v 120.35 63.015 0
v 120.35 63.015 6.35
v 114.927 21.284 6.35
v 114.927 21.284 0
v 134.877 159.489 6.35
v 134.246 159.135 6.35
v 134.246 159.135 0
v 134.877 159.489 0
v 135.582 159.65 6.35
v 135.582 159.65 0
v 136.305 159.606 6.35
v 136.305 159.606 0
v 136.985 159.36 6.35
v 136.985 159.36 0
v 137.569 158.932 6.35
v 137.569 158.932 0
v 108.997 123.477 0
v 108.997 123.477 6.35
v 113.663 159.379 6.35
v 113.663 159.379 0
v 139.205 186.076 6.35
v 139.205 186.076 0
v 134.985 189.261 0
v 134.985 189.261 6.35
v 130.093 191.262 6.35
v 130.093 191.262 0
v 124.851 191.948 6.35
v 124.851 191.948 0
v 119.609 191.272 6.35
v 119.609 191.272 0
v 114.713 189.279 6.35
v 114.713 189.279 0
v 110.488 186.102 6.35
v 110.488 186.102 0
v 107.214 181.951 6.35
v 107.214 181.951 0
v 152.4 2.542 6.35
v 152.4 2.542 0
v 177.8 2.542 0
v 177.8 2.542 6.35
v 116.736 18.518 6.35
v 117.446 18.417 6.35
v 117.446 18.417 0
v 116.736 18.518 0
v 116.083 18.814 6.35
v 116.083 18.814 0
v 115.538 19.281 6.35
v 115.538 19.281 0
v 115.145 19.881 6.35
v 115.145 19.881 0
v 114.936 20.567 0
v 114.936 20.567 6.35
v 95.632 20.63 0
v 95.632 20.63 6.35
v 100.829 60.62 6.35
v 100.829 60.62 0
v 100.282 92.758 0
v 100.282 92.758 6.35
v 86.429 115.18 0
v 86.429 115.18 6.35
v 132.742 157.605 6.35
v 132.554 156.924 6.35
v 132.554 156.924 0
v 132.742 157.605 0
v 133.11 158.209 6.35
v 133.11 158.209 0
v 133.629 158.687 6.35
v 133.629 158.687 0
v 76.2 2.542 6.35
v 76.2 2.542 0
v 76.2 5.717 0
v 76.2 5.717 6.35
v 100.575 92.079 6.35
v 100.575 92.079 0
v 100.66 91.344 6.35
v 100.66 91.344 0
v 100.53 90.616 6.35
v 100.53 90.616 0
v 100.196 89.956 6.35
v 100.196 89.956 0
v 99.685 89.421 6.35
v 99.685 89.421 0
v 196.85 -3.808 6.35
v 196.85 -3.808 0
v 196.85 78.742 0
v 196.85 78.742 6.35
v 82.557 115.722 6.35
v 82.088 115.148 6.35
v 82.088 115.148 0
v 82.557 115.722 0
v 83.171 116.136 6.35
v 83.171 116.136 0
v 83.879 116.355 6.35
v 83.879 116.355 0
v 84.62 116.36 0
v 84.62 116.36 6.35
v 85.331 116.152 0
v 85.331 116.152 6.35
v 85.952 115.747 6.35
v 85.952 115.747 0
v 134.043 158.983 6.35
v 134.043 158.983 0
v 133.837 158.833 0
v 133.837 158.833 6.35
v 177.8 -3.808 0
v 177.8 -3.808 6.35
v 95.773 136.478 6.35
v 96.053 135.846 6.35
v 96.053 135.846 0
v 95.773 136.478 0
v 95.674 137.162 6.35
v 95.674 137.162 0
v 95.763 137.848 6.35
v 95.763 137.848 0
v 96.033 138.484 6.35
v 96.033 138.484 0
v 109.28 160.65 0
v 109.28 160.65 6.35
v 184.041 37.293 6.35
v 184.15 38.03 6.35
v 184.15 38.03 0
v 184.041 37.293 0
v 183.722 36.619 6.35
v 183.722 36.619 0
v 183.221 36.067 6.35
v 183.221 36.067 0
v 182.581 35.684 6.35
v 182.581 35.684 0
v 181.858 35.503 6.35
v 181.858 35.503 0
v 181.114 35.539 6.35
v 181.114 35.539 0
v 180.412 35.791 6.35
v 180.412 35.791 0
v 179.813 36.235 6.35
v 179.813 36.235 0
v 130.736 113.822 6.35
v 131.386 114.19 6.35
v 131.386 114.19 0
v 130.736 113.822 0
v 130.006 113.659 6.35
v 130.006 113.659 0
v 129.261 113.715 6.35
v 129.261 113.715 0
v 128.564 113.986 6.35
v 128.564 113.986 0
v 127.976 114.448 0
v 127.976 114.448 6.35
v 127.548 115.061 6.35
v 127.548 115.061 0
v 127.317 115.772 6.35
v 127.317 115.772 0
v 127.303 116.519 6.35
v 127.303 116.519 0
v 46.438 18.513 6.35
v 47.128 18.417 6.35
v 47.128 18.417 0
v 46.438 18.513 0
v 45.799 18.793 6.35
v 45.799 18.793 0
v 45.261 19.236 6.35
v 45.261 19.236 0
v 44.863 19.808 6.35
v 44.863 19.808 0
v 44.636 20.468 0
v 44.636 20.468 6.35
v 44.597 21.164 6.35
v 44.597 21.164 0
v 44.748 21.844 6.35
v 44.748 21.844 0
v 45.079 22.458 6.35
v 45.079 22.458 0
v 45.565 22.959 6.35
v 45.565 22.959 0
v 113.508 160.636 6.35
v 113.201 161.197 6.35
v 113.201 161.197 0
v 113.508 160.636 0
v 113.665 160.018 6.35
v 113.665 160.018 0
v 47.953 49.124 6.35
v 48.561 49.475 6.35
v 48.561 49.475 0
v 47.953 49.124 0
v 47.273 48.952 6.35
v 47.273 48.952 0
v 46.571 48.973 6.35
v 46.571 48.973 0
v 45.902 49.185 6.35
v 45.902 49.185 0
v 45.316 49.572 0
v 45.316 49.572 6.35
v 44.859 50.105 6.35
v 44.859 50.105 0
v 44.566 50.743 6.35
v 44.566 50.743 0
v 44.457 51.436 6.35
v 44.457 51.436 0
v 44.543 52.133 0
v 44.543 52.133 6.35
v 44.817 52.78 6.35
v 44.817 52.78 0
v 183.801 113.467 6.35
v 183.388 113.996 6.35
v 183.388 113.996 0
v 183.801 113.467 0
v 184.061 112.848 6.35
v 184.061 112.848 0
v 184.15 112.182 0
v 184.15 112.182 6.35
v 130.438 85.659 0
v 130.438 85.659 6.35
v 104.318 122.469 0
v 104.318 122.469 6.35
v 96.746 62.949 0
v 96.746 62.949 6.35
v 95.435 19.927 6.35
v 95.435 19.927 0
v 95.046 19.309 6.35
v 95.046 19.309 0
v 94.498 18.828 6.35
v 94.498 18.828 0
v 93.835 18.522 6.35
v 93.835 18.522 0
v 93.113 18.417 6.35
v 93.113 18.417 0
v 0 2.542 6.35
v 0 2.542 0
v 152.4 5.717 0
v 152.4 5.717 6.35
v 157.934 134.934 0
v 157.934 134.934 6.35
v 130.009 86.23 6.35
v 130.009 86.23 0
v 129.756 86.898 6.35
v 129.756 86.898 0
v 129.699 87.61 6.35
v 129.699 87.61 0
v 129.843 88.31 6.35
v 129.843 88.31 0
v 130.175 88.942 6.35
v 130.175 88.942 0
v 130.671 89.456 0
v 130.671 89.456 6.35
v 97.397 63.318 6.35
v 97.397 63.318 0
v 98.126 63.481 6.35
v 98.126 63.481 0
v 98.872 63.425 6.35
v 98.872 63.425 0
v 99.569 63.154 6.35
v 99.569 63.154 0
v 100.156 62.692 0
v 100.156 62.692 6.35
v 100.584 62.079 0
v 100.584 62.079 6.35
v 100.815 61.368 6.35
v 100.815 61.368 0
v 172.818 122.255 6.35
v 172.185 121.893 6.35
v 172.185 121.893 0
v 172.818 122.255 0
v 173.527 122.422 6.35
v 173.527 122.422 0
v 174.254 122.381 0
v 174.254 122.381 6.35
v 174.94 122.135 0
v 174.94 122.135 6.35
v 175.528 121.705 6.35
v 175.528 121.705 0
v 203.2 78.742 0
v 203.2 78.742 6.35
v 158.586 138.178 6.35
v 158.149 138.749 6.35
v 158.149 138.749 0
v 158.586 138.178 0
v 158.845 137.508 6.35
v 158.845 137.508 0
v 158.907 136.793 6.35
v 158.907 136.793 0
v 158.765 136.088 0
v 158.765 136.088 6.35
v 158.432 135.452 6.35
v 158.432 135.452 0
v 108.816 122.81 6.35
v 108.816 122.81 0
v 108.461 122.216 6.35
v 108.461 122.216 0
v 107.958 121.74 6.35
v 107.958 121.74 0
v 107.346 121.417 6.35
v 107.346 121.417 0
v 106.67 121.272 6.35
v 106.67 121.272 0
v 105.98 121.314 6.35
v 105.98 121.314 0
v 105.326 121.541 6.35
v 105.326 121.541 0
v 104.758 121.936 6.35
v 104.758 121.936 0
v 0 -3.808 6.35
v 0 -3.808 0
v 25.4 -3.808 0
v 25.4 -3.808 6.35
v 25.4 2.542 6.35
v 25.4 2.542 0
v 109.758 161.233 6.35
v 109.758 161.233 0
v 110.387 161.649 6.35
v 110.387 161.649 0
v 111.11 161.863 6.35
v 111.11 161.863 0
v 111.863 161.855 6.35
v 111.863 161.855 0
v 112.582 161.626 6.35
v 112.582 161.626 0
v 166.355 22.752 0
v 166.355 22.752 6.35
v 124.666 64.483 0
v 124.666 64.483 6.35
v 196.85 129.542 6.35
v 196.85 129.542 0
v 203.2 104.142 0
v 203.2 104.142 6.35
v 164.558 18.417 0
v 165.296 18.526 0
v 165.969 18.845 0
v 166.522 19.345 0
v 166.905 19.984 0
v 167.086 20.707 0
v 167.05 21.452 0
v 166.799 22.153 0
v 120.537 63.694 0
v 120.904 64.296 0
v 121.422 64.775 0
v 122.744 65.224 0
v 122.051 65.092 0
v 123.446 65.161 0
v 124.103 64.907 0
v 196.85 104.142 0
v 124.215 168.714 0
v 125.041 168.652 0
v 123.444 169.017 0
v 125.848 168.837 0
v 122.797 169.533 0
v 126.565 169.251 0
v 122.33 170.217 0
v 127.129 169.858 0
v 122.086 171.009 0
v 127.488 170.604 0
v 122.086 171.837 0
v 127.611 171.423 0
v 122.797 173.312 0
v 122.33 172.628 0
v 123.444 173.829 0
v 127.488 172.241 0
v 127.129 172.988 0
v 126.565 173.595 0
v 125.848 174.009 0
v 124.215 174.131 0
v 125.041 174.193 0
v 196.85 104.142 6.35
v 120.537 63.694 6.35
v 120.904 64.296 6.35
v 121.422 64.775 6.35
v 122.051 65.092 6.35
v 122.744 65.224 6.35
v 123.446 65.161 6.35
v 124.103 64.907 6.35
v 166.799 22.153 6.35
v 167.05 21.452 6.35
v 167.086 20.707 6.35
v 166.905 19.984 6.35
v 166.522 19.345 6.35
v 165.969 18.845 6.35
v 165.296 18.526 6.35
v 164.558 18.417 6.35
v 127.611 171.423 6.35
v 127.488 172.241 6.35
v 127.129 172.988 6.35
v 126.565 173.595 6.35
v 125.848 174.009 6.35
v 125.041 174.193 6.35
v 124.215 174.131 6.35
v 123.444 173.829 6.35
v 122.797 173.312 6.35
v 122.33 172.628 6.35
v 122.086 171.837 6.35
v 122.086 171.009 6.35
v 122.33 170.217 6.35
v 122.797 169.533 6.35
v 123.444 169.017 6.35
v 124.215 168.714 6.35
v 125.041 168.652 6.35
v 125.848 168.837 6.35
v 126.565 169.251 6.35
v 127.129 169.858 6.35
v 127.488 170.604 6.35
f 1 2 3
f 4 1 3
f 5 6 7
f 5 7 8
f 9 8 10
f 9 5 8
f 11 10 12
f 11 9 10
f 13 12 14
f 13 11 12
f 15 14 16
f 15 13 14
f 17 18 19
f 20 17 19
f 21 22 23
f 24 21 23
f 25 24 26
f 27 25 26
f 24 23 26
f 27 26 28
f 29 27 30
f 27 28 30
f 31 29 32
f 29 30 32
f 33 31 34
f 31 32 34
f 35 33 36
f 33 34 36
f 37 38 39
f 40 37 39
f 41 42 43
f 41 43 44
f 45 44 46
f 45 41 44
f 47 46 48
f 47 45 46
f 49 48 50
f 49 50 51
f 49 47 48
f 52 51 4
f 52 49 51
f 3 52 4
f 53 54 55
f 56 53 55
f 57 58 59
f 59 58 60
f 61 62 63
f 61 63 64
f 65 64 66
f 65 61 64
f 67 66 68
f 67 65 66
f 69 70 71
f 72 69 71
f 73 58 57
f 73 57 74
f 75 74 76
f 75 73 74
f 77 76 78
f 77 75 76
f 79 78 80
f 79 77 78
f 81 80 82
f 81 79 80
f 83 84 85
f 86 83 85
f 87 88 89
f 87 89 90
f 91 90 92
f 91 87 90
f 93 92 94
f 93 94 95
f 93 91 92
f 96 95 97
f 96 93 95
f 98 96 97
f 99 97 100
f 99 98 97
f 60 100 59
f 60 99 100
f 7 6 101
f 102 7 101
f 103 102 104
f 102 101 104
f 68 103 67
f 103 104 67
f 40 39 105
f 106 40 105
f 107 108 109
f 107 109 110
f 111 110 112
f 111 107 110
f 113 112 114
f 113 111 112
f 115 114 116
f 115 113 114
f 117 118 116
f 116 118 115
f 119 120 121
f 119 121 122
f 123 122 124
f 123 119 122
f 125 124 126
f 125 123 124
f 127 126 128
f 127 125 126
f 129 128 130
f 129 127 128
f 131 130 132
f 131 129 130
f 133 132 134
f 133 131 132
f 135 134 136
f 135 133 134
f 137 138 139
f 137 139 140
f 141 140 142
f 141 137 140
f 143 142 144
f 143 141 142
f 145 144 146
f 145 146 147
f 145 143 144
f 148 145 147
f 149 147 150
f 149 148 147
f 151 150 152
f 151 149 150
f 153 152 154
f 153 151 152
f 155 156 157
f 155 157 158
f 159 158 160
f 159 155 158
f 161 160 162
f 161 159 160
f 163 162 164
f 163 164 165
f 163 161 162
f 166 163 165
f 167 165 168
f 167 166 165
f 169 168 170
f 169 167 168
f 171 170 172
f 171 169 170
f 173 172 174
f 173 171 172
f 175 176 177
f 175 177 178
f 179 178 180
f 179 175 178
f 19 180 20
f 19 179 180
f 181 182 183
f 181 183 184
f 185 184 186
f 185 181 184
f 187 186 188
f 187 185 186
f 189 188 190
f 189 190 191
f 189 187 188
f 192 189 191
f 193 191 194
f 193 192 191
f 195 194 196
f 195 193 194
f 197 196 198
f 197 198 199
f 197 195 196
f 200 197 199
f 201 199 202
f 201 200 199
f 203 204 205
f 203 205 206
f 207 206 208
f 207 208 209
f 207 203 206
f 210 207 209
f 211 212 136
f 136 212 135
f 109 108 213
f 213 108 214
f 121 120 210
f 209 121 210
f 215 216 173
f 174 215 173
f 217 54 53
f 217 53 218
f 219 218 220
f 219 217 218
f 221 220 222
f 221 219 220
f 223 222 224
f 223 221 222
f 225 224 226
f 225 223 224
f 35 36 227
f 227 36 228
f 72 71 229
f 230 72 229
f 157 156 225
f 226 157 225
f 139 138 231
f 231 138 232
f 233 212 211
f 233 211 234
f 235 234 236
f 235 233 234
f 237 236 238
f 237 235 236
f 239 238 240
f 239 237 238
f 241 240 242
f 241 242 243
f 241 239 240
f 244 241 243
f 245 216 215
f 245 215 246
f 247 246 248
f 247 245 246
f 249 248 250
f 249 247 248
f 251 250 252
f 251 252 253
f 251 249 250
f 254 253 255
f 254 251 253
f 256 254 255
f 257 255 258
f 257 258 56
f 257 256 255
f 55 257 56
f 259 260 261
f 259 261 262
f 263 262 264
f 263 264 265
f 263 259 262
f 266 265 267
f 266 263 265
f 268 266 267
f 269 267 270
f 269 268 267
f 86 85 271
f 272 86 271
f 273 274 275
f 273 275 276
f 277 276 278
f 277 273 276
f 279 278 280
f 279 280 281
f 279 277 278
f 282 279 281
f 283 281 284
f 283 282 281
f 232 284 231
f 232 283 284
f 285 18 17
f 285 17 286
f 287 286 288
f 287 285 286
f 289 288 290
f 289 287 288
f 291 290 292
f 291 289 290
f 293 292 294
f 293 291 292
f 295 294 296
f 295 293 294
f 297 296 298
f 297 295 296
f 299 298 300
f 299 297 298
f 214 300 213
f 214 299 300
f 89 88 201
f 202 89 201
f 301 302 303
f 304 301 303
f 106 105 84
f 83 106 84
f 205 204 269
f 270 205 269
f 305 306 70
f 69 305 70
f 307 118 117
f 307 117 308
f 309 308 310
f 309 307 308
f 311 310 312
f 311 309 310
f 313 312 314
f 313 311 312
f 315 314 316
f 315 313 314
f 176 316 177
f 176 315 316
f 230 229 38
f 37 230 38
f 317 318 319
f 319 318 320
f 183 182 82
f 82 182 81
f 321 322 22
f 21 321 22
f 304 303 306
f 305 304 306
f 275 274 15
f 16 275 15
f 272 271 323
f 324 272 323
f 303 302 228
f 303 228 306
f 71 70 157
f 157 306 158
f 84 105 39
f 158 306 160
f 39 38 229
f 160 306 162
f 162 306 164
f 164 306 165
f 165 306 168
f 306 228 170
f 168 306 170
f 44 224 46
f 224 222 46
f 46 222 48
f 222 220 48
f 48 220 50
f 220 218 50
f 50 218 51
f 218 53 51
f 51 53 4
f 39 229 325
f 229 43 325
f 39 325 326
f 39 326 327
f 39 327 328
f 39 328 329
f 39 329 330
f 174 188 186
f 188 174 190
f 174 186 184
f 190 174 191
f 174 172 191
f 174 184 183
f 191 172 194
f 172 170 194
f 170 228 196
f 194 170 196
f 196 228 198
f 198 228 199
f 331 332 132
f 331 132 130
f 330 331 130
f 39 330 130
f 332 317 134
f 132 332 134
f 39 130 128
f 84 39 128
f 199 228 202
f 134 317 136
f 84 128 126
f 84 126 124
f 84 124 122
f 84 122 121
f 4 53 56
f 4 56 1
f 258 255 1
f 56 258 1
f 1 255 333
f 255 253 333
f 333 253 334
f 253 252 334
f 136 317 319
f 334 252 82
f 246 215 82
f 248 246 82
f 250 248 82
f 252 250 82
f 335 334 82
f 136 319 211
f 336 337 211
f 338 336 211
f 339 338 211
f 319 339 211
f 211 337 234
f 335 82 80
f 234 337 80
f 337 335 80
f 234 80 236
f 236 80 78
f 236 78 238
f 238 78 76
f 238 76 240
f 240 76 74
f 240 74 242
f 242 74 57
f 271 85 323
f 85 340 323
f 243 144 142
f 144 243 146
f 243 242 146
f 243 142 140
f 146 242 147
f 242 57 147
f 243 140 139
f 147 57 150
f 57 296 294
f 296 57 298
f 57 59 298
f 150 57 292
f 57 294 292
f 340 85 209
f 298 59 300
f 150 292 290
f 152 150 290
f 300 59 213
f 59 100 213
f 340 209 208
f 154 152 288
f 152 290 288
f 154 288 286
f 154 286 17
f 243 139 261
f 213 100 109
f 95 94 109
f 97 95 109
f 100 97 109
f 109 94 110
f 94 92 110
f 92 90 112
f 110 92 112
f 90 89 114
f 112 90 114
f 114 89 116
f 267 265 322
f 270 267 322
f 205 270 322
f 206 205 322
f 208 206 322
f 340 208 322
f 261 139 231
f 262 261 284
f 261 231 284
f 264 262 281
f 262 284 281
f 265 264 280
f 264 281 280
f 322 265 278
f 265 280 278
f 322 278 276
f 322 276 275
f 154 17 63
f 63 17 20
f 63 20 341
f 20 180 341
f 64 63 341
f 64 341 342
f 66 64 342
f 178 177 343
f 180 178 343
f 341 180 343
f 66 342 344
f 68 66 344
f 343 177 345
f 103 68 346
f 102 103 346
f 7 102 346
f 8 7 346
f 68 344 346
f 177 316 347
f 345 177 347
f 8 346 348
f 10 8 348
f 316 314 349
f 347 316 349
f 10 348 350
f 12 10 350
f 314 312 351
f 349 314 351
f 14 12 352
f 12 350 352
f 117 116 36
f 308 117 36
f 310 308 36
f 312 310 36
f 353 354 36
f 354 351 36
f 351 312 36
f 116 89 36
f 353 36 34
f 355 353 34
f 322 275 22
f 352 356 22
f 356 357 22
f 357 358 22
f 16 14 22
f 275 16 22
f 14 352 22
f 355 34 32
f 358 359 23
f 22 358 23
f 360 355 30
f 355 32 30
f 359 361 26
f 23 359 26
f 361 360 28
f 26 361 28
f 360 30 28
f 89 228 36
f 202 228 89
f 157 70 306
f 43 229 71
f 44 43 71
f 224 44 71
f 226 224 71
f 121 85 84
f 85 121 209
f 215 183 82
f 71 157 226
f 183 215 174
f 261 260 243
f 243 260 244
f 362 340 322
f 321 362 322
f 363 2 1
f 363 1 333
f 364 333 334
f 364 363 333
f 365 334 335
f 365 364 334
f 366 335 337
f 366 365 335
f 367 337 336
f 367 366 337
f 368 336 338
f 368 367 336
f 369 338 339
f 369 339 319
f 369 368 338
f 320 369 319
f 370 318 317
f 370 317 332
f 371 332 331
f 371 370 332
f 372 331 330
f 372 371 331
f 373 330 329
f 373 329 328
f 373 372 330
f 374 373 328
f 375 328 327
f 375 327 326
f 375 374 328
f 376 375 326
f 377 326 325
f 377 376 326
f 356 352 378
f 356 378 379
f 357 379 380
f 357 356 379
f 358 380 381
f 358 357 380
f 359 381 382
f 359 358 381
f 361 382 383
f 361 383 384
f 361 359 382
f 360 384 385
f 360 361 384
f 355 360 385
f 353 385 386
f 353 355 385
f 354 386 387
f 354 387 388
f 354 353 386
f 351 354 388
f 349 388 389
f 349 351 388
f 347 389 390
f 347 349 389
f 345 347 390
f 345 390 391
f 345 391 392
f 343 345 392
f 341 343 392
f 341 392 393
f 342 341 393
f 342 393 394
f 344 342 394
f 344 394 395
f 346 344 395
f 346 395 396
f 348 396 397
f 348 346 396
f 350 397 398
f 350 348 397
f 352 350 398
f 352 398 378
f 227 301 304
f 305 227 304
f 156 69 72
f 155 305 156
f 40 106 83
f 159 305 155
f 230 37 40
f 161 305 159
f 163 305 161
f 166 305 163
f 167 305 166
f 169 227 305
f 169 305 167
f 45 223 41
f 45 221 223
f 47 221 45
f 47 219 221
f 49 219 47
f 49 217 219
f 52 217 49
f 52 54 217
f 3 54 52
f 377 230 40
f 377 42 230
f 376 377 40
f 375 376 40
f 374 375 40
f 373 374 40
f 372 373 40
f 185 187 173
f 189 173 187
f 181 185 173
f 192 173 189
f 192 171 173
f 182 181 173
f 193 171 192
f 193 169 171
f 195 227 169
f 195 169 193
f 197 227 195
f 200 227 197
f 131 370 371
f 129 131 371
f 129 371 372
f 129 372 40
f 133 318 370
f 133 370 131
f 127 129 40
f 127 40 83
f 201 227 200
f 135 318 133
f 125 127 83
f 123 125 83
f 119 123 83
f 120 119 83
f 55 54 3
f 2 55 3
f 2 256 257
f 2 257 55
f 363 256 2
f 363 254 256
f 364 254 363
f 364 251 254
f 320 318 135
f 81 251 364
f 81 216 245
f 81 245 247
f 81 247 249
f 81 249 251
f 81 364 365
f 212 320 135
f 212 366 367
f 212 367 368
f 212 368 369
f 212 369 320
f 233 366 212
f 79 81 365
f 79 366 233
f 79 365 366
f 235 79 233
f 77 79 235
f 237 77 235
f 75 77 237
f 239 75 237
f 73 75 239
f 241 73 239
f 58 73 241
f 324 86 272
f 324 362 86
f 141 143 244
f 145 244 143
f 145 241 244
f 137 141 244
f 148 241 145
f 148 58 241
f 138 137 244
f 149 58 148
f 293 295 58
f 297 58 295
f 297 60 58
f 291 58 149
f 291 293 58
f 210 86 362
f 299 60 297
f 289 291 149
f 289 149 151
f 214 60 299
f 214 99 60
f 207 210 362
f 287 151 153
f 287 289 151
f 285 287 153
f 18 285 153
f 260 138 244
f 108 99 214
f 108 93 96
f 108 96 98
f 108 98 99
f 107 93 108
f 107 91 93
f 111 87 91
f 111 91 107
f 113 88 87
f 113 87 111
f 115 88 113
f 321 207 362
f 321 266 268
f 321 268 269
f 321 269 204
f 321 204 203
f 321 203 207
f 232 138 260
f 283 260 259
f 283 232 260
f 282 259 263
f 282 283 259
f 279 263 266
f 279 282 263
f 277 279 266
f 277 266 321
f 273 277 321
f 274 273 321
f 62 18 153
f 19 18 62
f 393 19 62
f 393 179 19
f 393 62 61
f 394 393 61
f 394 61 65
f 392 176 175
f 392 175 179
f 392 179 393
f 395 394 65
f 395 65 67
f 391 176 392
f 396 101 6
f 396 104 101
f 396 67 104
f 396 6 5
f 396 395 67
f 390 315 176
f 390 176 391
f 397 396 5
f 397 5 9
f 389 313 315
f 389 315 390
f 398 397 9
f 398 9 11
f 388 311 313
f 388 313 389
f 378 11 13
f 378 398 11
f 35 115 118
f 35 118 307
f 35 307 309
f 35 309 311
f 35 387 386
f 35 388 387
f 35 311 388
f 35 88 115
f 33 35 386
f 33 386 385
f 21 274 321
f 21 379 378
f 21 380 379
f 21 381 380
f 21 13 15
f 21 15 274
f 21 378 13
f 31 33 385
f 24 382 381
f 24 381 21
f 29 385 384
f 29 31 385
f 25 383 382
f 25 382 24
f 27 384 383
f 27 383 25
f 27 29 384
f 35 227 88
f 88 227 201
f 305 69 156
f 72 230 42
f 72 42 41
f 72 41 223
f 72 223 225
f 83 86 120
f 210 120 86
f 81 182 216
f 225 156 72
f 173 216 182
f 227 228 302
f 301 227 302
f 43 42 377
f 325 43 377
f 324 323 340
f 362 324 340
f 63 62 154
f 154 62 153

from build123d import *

# Parameters (mm, degrees)
SKETCH2_R           = 2.778125
BOSS_EXTRUDE1_DEPTH = 6.35
CUT_EXTRUDE1_DEPTH  = 280.596929737
FILLET1_R           = 2.54


with BuildPart() as part:
    # Sketch2 → Boss-Extrude1 (new body)
    with BuildSketch(Plane.XY):
        with BuildLine():
            Line((25.4, 2.542062626), (76.2, 2.542062626))
            Line((76.2, 2.542062626), (76.2, 5.717062626))
            Line((76.2, 5.717062626), (152.4, 5.717062626))
            Line((152.4, 5.717062626), (152.4, 2.542062626))
            Line((152.4, 2.542062626), (177.8, 2.542062626))
            Line((177.8, 2.542062626), (177.8, -3.807937374))
            Line((177.8, -3.807937374), (196.85, -3.807937374))
            Line((196.85, -3.807937374), (196.85, 78.742062626))
            Line((196.85, 78.742062626), (203.2, 78.742062626))
            Line((203.2, 78.742062626), (203.2, 104.142062626))
            Line((203.2, 104.142062626), (196.85, 104.142062626))
            Line((196.85, 104.142062626), (196.85, 129.542062626))
            Line((196.85, 129.542062626), (139.204596213, 186.076487834))
            ThreePointArc((139.204596213, 186.076487834), (122.208232851, 191.779061014), (107.214428724, 181.951469947))
            Line((107.214428724, 181.951469947), (0, 2.542062626))
            Line((0, 2.542062626), (0, -3.807937374))
            Line((0, -3.807937374), (25.4, -3.807937374))
            Line((25.4, -3.807937374), (25.4, 2.542062626))
        make_face()
        with Locations((124.833126, 171.422598626)):
            Circle(SKETCH2_R, mode=Mode.SUBTRACT)
    extrude(amount=BOSS_EXTRUDE1_DEPTH)

    # Sketch4 → Cut-Extrude1 (cut, through all)
    with BuildSketch(Plane.XY.offset(6.35)):
        with BuildLine():
            ThreePointArc((113.815309866, 160.551532388), (112.421969705, 162.174055338), (111.26558656, 163.973153877))
            Line((111.26558656, 163.973153877), (95.241664491, 137.159203595))
            Line((95.241664491, 137.159203595), (108.075962418, 116.386657845))
            Line((108.075962418, 116.386657845), (113.815309866, 160.551532388))
        make_face()
        with BuildLine():
            Line((160.218857543, 136.71884322), (135.883782706, 160.584917146))
            ThreePointArc((135.883782706, 160.584917146), (134.376571421, 159.23674605), (132.706463437, 158.096574796))
            Line((132.706463437, 158.096574796), (126.50513789, 110.376730818))
            Line((126.50513789, 110.376730818), (160.218857543, 136.71884322))
        make_face()
        Polygon((101.478261059, 90.822056657), (84.231843224, 118.735699112), (37.832728657, 41.092813319), align=None)
        Polygon((184.15, 113.248916833), (173.938776136, 123.263343551), (128.409628791, 87.689282626), (184.15, 31.894074467), align=None)
        Polygon((101.62722196, 66.762930434), (39.752190498, 18.417062626), (95.344542887, 18.417062626), align=None)
        Polygon((170.686233709, 18.417062626), (121.01587543, 68.136286224), (114.554724978, 18.417062626), align=None)
    extrude(amount=-CUT_EXTRUDE1_DEPTH, mode=Mode.SUBTRACT)

    # Fillet1
    # the kernel refuses this fillet: 2.54 mm, written as the material it adds along each edge
    with BuildSketch(Plane(origin=(101.478261059, 90.822056657, 6.35), x_dir=(-0.787987305363456, -0.6156914865304209, 0), z_dir=(0, 0, -1))) as fillet1_piece_1:
        with BuildLine():
            CenterArc((FILLET1_R * 0.89579463255, FILLET1_R), FILLET1_R, 186.292375304, 83.707624696)
            Line((-FILLET1_R * 0.0981809171118, FILLET1_R * 0.890397962274), (0, 0))
            Line((0, 0), (FILLET1_R * 0.89579463255, 0))
        make_face()
    extrude(amount=6.35)
    with BuildSketch(Plane(origin=(37.832728657, 41.092813319, 6.35), x_dir=(0.7879873053634544, 0.615691486530423, 0), z_dir=(0, 0, -1))) as fillet1_piece_2:
        with BuildLine():
            CenterArc((FILLET1_R * 5.36015588483, -FILLET1_R), FILLET1_R, 90, 158.864572417)
            Line((FILLET1_R * 4.9995822743, -FILLET1_R * 1.9327307604), (0, 0))
            Line((0, 0), (FILLET1_R * 5.36015588483, 0))
        make_face()
    extrude(amount=6.35)
    with BuildSketch(Plane(origin=(84.231843224, 118.735699112, 6.35), x_dir=(0.5256172693760891, -0.8507211565099483, 0), z_dir=(0, 0, -1))) as fillet1_piece_3:
        with BuildLine():
            CenterArc((FILLET1_R * 1.64561036796, FILLET1_R), FILLET1_R, 152.572197113, 117.427802887)
            Line((FILLET1_R * 0.758018400173, FILLET1_R * 1.46063054471), (0, 0))
            Line((0, 0), (FILLET1_R * 1.64561036796, 0))
        make_face()
    extrude(amount=6.35)
    with BuildSketch(Plane(origin=(111.26558656, 163.973153877, 6.35), x_dir=(-0.5129778962436395, -0.8584018161475719, 0), z_dir=(0, 0, -1))) as fillet1_piece_4:
        with BuildLine():
            CenterArc((3.871144204, -2.54), FILLET1_R, 90, 107.056570321)
            ThreePointArc((1.442864529, -3.285022026), (0.816940233, -1.600561505), (0, 0))
            Line((0, 0), (3.871144204, 0))
        make_face()
    extrude(amount=6.35)
    with BuildSketch(Plane(origin=(113.815309866, 160.551532388, 6.35), x_dir=(-0.12886916491369038, -0.9916616047495476, 0), z_dir=(0, 0, -1))) as fillet1_piece_5:
        with BuildLine():
            CenterArc((1.182123264, 2.54), FILLET1_R, 222.036471985, 47.963528015)
            ThreePointArc((-0.704382325, 0.839207048), (-0.344763298, 0.425838049), (0, 0))
            Line((0, 0), (1.182123264, 0))
        make_face()
    extrude(amount=6.35)
    with BuildSketch(Plane(origin=(108.075962418, 116.386657845, 6.35), x_dir=(-0.5256172693760838, 0.8507211565099515, 0), z_dir=(0, 0, -1))) as fillet1_piece_6:
        with BuildLine():
            CenterArc((FILLET1_R * 2.81500526937, FILLET1_R), FILLET1_R, 129.114057402, 140.885942598)
            Line((FILLET1_R * 2.18413907953, FILLET1_R * 1.77589164869), (0, 0))
            Line((0, 0), (FILLET1_R * 2.81500526937, 0))
        make_face()
    extrude(amount=6.35)
    with BuildSketch(Plane(origin=(95.241664491, 137.159203595, 6.35), x_dir=(0.5129778962436408, 0.8584018161475709, 0), z_dir=(0, 0, -1))) as fillet1_piece_7:
        with BuildLine():
            CenterArc((FILLET1_R * 0.607677260346, FILLET1_R), FILLET1_R, 207.427802887, 62.572197113)
            Line((-FILLET1_R * 0.279914707441, FILLET1_R * 0.539369455291), (0, 0))
            Line((0, 0), (FILLET1_R * 0.607677260346, 0))
        make_face()
    extrude(amount=6.35)
    with BuildSketch(Plane(origin=(39.752190498, 18.417062626, 6.35), x_dir=(0.787987305363458, 0.6156914865304186, 0), z_dir=(0, 0, -1))) as fillet1_piece_8:
        with BuildLine():
            CenterArc((FILLET1_R * 2.9040312307, FILLET1_R), FILLET1_R, 128.002182129, 141.997817871)
            Line((FILLET1_R * 2.28833974417, FILLET1_R * 1.78798730536), (0, 0))
            Line((0, 0), (FILLET1_R * 2.9040312307, 0))
        make_face()
    extrude(amount=6.35)
    with BuildSketch(Plane(origin=(101.62722196, 66.762930434, 6.35), x_dir=(-0.7879873053634603, -0.6156914865304155, 0), z_dir=(0, 0, -1))) as fillet1_piece_9:
        with BuildLine():
            CenterArc((FILLET1_R * 2.438641865, -FILLET1_R), FILLET1_R, 90, 135.406432707)
            Line((FILLET1_R * 1.73656875695, -FILLET1_R * 1.71210487357), (0, 0))
            Line((0, 0), (FILLET1_R * 2.438641865, 0))
        make_face()
    extrude(amount=6.35)
    with BuildSketch(Plane(origin=(95.344542887, 18.417062626, 6.35), x_dir=(-1, 0, 0), z_dir=(0, 0, -1))) as fillet1_piece_10:
        with BuildLine():
            CenterArc((FILLET1_R * 0.878455746309, FILLET1_R), FILLET1_R, 187.404250578, 82.595749422)
            Line((-FILLET1_R * 0.11320585844, FILLET1_R * 0.871130835086), (0, 0))
            Line((0, 0), (FILLET1_R * 0.878455746309, 0))
        make_face()
    extrude(amount=6.35)
    with BuildSketch(Plane(origin=(121.01587543, 68.136286224, 6.35), x_dir=(0.7067590436590283, -0.7074543477894356, 0), z_dir=(0, 0, -1))) as fillet1_piece_11:
        with BuildLine():
            CenterArc((FILLET1_R * 2.03333963012, FILLET1_R), FILLET1_R, 142.376080862, 127.623919138)
            Line((FILLET1_R * 1.2413047717, FILLET1_R * 1.61047586606), (0, 0))
            Line((0, 0), (FILLET1_R * 2.03333963012, 0))
        make_face()
    extrude(amount=6.35)
    with BuildSketch(Plane(origin=(170.686233709, 18.417062626, 6.35), x_dir=(-1, 0, 0), z_dir=(0, 0, -1))) as fillet1_piece_12:
        with BuildLine():
            CenterArc((FILLET1_R * 2.41253594524, FILLET1_R), FILLET1_R, 135.028169716, 134.971830284)
            Line((FILLET1_R * 1.70508159745, FILLET1_R * 1.70675904366), (0, 0))
            Line((0, 0), (FILLET1_R * 2.41253594524, 0))
        make_face()
    extrude(amount=6.35)
    with BuildSketch(Plane(origin=(114.554724978, 18.417062626, 6.35), x_dir=(1, 0, 0), z_dir=(0, 0, -1))) as fillet1_piece_13:
        with BuildLine():
            CenterArc((FILLET1_R * 1.13836127113, -FILLET1_R), FILLET1_R, 90, 97.404250578)
            Line((FILLET1_R * 0.14669966638, -FILLET1_R * 1.12886916491), (0, 0))
            Line((0, 0), (FILLET1_R * 1.13836127113, 0))
        make_face()
    extrude(amount=6.35)
    with BuildSketch(Plane(origin=(132.706463437, 158.096574796, 6.35), x_dir=(-0.12886916491355233, -0.9916616047495656, 0), z_dir=(0, 0, -1))) as fillet1_piece_14:
        with BuildLine():
            CenterArc((1.182123264, -2.54), FILLET1_R, 90, 47.963528015)
            ThreePointArc((-0.704382325, -0.839207048), (-0.344763298, -0.425838049), (0, 0))
            Line((0, 0), (1.182123264, 0))
        make_face()
    extrude(amount=6.35)
    with BuildSketch(Plane(origin=(135.883782706, 160.584917146, 6.35), x_dir=(0.7139531891838808, -0.7001934330270213, 0), z_dir=(0, 0, -1))) as fillet1_piece_15:
        with BuildLine():
            CenterArc((2.360070775, 2.54), FILLET1_R, 188.103931403, 81.896068597)
            ThreePointArc((-0.154564753, 2.181938326), (-0.038689543, 1.093703013), (0, 0))
            Line((0, 0), (2.360070775, 0))
        make_face()
    extrude(amount=6.35)
    with BuildSketch(Plane(origin=(160.218857543, 136.71884322, 6.35), x_dir=(-0.7879873053634604, -0.6156914865304155, 0), z_dir=(0, 0, -1))) as fillet1_piece_16:
        with BuildLine():
            CenterArc((FILLET1_R * 1.14139198058, FILLET1_R), FILLET1_R, 172.444707349, 97.555292651)
            Line((FILLET1_R * 0.150073543693, FILLET1_R * 1.13148291406), (0, 0))
            Line((0, 0), (FILLET1_R * 1.14139198058, 0))
        make_face()
    extrude(amount=6.35)
    with BuildSketch(Plane(origin=(126.50513789, 110.376730818, 6.35), x_dir=(0.1288691649135192, 0.9916616047495699, 0), z_dir=(0, 0, -1))) as fillet1_piece_17:
        with BuildLine():
            CenterArc((FILLET1_R * 2.438641865, FILLET1_R), FILLET1_R, 134.593567293, 135.406432707)
            Line((FILLET1_R * 1.73656875695, FILLET1_R * 1.71210487357), (0, 0))
            Line((0, 0), (FILLET1_R * 2.438641865, 0))
        make_face()
    extrude(amount=6.35)
    with BuildSketch(Plane(origin=(184.15, 113.248916833, 6.35), x_dir=(0, -1, 0), z_dir=(0, 0, -1))) as fillet1_piece_18:
        with BuildLine():
            CenterArc((FILLET1_R * 0.41992468346, FILLET1_R), FILLET1_R, 224.44252522, 45.55747478)
            Line((-FILLET1_R * 0.294028505724, FILLET1_R * 0.299806566973), (0, 0))
            Line((0, 0), (FILLET1_R * 0.41992468346, 0))
        make_face()
    extrude(amount=6.35)
    with BuildSketch(Plane(origin=(184.15, 31.894074467, 6.35), x_dir=(-0.7067590436590262, 0.7074543477894377, 0), z_dir=(0, 0, -1))) as fillet1_piece_19:
        with BuildLine():
            CenterArc((FILLET1_R * 2.41589317195, FILLET1_R), FILLET1_R, 134.971830284, 135.028169716)
            Line((FILLET1_R * 1.70913412829, FILLET1_R * 1.70745434779), (0, 0))
            Line((0, 0), (FILLET1_R * 2.41589317195, 0))
        make_face()
    extrude(amount=6.35)
    with BuildSketch(Plane(origin=(128.409628791, 87.689282626, 6.35), x_dir=(0.7879873053634587, 0.6156914865304174, 0), z_dir=(0, 0, -1))) as fillet1_piece_20:
        with BuildLine():
            CenterArc((FILLET1_R * 1.12969130859, FILLET1_R), FILLET1_R, 173.030351844, 96.969648156)
            Line((FILLET1_R * 0.137080737194, FILLET1_R * 1.12134353531), (0, 0))
            Line((0, 0), (FILLET1_R * 1.12969130859, 0))
        make_face()
    extrude(amount=6.35)
    with BuildSketch(Plane(origin=(173.938776136, 123.263343551, 6.35), x_dir=(-0.7879873053634626, -0.6156914865304124, 0), z_dir=(0, 0, -1))) as fillet1_piece_21:
        with BuildLine():
            CenterArc((FILLET1_R * 0.876123204837, -FILLET1_R), FILLET1_R, 90, 82.444707349)
            Line((-FILLET1_R * 0.115195232049, -FILLET1_R * 0.868517085939), (0, 0))
            Line((0, 0), (FILLET1_R * 0.876123204837, 0))
        make_face()
    extrude(amount=6.35)


solid = part.part
